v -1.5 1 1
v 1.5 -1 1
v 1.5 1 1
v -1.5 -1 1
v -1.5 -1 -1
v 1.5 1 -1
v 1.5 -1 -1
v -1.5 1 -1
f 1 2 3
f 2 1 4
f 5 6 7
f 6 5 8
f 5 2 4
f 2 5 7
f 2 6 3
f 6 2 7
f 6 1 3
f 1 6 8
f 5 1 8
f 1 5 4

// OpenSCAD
union() {
    cube(size=[2.0, 3.0, 2.0], center=true);
    !cube(size=[3.0, 2.0, 2.0], center=true);
};
